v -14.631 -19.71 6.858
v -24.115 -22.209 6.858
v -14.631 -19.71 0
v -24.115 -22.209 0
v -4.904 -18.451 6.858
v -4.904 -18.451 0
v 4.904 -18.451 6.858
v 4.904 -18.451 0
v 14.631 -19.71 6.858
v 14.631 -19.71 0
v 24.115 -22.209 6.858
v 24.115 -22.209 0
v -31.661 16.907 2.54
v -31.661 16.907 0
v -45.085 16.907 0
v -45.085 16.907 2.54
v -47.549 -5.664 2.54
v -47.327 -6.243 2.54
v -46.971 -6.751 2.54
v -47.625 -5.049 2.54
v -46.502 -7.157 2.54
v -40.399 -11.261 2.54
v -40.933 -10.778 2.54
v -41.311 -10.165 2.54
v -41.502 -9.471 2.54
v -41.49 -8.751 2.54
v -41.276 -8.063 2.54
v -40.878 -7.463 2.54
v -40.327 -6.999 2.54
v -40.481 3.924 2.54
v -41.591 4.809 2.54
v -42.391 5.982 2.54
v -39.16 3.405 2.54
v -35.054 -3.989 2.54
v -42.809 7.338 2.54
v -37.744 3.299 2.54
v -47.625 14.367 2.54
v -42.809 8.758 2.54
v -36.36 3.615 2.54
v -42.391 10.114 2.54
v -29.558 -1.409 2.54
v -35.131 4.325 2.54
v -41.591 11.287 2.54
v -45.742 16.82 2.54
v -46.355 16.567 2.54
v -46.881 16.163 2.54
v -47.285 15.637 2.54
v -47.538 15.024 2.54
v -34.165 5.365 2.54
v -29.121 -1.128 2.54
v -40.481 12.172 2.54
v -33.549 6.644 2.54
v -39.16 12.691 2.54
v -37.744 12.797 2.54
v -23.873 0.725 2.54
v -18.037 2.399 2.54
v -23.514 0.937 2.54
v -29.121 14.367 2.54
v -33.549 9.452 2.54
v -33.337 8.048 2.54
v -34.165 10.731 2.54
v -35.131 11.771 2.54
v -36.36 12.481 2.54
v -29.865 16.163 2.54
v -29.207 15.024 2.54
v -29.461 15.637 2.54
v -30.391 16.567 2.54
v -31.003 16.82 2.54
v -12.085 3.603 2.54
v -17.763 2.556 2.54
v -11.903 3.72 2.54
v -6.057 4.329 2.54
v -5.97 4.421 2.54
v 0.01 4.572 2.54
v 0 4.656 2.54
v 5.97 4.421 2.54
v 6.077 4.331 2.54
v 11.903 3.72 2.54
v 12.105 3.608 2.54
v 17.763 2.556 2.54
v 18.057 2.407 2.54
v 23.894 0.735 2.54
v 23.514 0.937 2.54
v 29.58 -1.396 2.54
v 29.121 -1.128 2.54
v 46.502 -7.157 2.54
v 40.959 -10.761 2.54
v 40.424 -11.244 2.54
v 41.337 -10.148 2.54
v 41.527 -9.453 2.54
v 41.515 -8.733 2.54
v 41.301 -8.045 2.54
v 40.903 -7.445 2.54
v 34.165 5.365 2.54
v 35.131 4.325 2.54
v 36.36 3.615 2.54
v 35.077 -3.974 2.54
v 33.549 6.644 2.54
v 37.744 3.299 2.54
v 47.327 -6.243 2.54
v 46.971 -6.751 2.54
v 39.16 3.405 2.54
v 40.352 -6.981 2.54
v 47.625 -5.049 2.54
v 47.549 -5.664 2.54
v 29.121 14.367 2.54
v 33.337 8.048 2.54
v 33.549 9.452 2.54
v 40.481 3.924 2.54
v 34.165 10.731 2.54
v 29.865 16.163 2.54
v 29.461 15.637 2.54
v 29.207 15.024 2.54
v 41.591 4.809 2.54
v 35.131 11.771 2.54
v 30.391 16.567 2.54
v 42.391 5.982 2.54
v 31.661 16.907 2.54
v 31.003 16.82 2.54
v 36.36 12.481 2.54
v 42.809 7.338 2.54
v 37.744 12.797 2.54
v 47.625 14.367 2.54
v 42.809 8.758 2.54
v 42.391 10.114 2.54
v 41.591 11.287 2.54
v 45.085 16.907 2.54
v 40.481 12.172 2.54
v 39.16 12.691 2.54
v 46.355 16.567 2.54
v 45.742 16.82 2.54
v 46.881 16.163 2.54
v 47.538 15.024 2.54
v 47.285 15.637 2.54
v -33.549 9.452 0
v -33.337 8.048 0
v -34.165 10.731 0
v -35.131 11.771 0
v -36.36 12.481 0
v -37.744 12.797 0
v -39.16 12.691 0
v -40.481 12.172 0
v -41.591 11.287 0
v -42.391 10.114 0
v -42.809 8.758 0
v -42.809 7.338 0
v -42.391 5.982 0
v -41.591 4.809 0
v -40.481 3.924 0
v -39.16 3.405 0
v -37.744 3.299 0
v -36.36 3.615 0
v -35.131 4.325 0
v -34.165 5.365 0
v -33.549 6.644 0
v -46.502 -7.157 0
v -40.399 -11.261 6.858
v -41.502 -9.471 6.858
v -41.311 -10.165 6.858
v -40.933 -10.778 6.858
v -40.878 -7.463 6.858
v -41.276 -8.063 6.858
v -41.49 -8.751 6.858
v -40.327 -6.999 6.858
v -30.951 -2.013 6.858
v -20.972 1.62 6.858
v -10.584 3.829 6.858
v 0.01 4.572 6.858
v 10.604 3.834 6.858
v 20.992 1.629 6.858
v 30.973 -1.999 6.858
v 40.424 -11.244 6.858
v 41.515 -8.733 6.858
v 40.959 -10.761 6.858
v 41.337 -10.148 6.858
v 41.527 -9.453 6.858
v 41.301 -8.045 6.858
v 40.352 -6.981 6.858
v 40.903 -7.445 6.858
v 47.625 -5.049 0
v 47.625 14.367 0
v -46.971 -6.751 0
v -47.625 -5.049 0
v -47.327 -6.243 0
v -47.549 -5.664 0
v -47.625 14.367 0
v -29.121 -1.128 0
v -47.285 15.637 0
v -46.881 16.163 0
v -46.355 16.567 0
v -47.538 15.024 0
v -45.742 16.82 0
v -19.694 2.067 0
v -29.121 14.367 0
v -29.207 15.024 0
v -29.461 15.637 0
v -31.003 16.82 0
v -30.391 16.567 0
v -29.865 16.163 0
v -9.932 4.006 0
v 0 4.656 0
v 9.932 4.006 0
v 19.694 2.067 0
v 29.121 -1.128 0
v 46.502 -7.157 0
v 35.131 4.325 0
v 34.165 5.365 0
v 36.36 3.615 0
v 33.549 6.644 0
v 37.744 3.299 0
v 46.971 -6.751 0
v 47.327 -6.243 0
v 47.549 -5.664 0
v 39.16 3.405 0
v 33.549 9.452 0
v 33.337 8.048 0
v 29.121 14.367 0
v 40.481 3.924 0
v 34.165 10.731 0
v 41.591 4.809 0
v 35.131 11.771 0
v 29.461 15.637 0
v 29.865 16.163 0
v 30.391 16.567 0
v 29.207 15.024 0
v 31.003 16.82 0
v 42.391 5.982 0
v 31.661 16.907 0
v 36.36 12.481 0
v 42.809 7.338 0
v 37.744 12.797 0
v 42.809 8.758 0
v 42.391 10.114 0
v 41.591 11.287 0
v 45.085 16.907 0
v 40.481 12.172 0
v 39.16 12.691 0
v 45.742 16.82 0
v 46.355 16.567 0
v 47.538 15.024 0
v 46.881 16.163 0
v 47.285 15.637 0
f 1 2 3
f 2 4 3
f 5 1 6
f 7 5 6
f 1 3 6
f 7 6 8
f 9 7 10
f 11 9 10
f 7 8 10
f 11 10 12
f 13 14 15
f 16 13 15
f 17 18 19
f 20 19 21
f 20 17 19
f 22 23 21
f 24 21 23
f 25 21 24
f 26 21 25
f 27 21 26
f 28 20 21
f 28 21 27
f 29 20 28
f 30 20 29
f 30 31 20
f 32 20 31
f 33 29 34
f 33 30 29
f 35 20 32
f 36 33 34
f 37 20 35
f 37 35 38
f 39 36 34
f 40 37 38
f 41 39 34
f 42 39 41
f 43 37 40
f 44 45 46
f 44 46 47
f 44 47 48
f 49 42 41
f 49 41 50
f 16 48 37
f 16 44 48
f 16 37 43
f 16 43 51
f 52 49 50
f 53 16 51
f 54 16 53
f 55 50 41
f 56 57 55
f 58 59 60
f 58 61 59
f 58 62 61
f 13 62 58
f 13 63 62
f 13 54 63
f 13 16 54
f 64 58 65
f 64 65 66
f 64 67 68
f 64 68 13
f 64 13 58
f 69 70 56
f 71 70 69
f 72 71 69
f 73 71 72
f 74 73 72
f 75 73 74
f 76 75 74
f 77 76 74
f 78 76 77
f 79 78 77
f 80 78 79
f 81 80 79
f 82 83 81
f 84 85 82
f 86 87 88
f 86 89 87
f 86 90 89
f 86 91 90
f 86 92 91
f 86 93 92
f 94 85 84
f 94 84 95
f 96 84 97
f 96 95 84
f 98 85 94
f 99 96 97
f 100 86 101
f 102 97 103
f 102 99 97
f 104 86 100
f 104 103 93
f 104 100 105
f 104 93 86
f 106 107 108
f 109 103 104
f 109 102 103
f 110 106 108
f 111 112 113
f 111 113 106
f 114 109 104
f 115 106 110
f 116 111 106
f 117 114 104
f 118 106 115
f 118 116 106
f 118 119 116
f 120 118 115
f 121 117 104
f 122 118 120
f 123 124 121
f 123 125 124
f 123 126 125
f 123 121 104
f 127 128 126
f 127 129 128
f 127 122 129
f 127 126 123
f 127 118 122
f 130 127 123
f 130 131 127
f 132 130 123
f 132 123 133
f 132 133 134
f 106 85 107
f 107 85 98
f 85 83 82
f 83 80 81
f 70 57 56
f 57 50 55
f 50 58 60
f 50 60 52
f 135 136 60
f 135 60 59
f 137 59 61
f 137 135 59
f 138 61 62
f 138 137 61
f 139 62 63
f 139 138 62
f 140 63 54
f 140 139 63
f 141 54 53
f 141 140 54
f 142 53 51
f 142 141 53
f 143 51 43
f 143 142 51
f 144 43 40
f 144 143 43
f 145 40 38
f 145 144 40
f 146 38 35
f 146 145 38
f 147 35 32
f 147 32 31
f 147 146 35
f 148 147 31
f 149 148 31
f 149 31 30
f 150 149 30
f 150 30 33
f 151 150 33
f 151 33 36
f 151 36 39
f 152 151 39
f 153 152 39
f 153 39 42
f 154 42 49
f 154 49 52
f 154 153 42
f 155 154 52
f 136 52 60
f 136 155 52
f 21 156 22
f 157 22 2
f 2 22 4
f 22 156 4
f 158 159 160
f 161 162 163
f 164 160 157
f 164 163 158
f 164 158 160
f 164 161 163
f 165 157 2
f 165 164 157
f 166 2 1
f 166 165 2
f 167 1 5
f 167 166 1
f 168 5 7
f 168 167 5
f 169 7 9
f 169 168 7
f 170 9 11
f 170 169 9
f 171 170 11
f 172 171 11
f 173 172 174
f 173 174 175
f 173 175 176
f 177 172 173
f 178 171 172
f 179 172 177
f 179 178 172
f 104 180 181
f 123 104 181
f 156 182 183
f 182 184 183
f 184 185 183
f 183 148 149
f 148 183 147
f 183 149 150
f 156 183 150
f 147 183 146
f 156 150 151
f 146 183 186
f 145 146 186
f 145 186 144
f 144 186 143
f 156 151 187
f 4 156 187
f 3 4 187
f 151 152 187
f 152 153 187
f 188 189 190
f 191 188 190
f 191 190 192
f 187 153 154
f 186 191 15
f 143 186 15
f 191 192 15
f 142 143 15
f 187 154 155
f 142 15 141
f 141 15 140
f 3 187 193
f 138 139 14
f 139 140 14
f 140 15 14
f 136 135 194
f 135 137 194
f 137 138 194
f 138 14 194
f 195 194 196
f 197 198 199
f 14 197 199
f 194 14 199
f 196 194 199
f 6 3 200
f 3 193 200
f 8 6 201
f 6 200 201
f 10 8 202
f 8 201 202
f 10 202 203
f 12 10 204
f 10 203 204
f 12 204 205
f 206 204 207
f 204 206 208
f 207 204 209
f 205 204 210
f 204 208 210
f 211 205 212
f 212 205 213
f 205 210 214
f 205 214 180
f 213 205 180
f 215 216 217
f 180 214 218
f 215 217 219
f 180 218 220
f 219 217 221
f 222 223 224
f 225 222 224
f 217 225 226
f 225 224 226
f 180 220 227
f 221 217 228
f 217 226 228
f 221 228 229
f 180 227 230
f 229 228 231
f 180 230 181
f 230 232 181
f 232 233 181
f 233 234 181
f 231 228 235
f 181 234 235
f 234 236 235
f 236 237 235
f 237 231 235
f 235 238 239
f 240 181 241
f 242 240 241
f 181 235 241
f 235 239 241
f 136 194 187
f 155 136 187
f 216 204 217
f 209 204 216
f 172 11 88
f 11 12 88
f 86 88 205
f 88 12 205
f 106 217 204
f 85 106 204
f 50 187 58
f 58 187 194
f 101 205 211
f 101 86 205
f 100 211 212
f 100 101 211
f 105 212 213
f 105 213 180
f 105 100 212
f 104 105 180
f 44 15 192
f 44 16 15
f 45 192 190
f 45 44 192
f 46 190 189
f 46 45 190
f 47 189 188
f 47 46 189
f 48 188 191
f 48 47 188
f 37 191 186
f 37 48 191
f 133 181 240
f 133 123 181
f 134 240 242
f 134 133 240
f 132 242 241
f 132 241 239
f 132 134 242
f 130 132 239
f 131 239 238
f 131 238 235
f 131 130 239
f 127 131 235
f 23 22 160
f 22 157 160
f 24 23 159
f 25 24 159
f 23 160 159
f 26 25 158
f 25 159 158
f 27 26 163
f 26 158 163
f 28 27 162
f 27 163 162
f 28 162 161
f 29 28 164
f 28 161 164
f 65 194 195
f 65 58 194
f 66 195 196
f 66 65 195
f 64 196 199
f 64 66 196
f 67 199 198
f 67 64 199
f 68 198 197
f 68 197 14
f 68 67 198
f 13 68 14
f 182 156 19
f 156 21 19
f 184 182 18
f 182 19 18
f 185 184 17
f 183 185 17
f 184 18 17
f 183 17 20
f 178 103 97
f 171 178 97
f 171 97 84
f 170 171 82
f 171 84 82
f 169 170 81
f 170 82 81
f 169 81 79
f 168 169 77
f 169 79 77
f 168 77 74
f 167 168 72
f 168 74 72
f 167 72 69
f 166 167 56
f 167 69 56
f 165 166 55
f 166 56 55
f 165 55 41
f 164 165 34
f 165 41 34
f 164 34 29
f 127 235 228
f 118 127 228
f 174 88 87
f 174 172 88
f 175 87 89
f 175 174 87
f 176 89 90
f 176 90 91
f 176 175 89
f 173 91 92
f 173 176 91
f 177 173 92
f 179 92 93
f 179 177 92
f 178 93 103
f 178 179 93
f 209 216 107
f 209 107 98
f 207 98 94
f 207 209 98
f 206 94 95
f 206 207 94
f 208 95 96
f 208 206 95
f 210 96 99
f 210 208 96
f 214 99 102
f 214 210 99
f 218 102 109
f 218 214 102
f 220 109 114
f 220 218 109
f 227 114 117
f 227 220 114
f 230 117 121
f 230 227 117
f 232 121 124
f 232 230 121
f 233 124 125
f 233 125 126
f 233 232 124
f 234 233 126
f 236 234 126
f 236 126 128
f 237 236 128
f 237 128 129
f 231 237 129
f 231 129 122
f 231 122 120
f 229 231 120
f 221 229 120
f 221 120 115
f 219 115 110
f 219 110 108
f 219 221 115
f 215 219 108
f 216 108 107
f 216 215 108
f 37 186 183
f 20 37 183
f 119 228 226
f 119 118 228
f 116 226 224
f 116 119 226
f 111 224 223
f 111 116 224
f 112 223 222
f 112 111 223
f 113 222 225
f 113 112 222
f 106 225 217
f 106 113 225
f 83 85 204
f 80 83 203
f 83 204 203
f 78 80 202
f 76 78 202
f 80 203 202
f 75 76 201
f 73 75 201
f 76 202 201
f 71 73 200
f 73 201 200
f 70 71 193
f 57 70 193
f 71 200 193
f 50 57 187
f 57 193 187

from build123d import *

# Parameters (mm, degrees)
SKETCH1_R           = 4.762500000000004
BOSS_EXTRUDE1_DEPTH = 2.54
BOSS_EXTRUDE2_DEPTH = 4.318
FILLET1_R           = 2.54


with BuildPart() as part:
    # Sketch1 → Boss-Extrude1 (new body)
    with BuildSketch(Plane.XY):
        with BuildLine():
            Line((-29.12070870680529, -1.1283392484503774), (-29.12070870680529, 16.90683065104644))
            Line((-29.12070870680529, 16.90683065104644), (-47.625, 16.906830651046437))
            Line((-47.625, 16.906830651046437), (-47.625, -6.402026683274578))
            Line((-47.625, -6.402026683274578), (-24.11489201542563, -22.209169348953562))
            ThreePointArc((-24.11489201542563, -22.209169348953562), (4.67e-15, -18.29272199465825), (24.11489201542563, -22.209169348953562))
            Line((24.11489201542563, -22.209169348953562), (47.625, -6.402026683274578))
            Line((47.625, -6.402026683274578), (47.625, 16.906830651046437))
            Line((47.625, 16.906830651046437), (29.12070870680529, 16.90683065104644))
            Line((29.12070870680529, 16.90683065104644), (29.12070870680529, -1.1283392484503774))
            ThreePointArc((29.12070870680529, -1.1283392484503774), (4.67e-15, 4.6555807384347645), (-29.12070870680529, -1.1283392484503774))
        make_face()
        with Locations((-38.099999999999994, 8.048015683552894)):
            Circle(SKETCH1_R, mode=Mode.SUBTRACT)
        with Locations(Location((38.099999999999994, 8.048015683552894, 0), (0, 0, 180))):
            Circle(SKETCH1_R, mode=Mode.SUBTRACT)
    extrude(amount=BOSS_EXTRUDE1_DEPTH)

    # Sketch2 → Boss-Extrude2 (add)
    with BuildSketch(Plane.XY.offset(2.54)):
        with BuildLine():
            Line((-43.56033013161569, -9.13492848621798), (-24.114892015425625, -22.209169348953562))
            ThreePointArc((-24.114892015425625, -22.209169348953562), (4.67e-15, -18.29272199465825), (24.11489201542563, -22.209169348953562))
            Line((24.11489201542563, -22.209169348953562), (43.58710776229448, -9.11692440777367))
            ThreePointArc((43.58710776229448, -9.11692440777367), (0.01055892070138382, 4.5719736134911955), (-43.56033013161569, -9.13492848621798))
        make_face()
    extrude(amount=BOSS_EXTRUDE2_DEPTH)

    # Fillet1
    fillet1_edges = [part.edges().sort_by_distance(p)[0] for p in [
        (47.625, -6.402026683274578, 1.27),
        (-47.625, -6.402026683274578, 1.27),
        (-47.625, 16.906830651046437, 1.27),
        (-29.12070870680529, 16.90683065104644, 1.27),
        (29.12070870680529, 16.90683065104644, 1.27),
        (47.625, 16.906830651046437, 1.27),
        (43.58710776229448, -9.116924407773672, 4.699),
        (-43.56033013161569, -9.13492848621799, 4.699),
    ]]
    fillet(fillet1_edges, radius=FILLET1_R)


solid = part.part
